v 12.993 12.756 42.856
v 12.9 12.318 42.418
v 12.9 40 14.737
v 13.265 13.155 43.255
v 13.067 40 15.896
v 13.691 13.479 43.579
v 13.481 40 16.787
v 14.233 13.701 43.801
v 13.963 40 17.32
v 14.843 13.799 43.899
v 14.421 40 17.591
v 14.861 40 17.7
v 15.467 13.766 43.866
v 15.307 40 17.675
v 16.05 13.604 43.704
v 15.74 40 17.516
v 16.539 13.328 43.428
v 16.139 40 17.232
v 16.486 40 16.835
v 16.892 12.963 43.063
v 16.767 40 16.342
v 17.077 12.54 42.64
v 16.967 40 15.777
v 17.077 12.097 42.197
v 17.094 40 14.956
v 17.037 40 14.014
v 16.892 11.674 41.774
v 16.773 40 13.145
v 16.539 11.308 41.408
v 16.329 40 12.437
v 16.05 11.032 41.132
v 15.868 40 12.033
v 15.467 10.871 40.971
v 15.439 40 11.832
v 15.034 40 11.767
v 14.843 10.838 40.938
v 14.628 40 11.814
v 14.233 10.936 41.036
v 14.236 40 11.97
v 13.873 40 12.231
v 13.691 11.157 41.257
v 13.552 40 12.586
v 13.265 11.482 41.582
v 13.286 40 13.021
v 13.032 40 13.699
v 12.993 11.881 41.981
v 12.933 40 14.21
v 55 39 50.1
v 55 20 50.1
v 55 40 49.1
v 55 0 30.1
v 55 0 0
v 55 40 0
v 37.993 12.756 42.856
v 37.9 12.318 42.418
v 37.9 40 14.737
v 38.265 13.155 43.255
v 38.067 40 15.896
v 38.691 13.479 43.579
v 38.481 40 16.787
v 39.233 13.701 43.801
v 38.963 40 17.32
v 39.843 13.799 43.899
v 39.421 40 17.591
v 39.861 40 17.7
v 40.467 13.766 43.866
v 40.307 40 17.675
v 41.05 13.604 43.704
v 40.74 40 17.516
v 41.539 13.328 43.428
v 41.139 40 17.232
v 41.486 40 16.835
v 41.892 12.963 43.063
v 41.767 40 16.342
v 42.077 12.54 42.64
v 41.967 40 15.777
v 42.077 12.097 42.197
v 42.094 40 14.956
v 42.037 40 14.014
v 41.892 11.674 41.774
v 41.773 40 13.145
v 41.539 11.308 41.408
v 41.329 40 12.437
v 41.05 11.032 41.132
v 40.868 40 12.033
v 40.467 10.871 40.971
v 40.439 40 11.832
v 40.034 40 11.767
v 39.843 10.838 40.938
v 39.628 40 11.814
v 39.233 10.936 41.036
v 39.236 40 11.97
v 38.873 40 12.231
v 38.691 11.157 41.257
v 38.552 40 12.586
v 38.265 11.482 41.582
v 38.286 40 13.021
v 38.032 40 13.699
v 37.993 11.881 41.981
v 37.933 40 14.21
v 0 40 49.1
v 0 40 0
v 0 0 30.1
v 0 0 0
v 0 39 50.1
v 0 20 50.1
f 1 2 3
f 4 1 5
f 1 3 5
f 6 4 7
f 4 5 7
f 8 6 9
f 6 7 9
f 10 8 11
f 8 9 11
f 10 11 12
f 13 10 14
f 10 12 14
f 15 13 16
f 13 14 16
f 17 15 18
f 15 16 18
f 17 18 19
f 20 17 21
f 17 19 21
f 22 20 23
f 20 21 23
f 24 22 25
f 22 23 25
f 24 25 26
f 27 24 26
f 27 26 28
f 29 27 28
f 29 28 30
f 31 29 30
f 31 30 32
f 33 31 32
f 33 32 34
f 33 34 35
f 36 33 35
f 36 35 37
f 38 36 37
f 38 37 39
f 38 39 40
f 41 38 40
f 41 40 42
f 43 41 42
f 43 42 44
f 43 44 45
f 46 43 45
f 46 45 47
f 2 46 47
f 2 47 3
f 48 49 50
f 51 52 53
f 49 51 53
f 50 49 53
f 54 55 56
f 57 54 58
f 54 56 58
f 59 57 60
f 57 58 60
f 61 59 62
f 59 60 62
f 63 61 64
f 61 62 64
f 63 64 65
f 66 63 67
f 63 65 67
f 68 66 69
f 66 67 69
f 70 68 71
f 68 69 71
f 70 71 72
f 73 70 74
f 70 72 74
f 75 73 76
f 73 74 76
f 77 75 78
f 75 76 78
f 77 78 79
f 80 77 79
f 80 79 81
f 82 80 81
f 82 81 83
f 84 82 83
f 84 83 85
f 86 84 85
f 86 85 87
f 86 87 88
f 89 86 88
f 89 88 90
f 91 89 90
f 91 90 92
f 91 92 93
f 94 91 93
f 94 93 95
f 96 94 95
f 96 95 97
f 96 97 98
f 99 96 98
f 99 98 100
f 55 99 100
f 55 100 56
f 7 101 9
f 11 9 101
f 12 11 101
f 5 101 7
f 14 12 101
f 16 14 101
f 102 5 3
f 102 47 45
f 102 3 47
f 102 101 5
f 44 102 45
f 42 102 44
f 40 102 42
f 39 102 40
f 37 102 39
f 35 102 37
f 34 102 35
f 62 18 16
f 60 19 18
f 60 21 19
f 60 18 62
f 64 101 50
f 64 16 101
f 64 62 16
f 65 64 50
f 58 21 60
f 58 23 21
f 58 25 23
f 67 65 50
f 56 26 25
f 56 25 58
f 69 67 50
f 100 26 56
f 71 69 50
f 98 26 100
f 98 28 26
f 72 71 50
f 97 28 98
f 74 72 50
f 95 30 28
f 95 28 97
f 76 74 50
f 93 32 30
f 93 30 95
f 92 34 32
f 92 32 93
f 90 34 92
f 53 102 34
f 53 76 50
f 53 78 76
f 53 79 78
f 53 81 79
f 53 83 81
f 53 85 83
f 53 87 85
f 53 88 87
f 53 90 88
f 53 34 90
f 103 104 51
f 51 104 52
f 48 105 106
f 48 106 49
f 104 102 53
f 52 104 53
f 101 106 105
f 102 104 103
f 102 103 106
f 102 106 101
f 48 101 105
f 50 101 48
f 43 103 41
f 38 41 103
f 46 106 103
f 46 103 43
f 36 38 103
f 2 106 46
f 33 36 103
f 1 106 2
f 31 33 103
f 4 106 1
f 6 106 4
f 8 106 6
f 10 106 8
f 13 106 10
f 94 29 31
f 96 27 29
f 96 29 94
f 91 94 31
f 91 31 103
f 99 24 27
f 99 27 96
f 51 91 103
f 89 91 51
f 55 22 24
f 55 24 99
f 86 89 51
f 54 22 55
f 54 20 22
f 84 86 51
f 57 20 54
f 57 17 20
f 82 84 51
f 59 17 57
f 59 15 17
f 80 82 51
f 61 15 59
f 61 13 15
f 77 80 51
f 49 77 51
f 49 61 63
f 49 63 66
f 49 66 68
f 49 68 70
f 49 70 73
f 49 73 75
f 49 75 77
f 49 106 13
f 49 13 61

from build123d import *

# Parameters (mm, degrees)
F0_W     = 55
F0_H     = 40
F1_DEPTH = 50.1
F2_SIZE  = 20
F4_D     = 4.2
F5_SIZE  = 1


with BuildPart() as f1:
    # F0 (on Top) → F1 (new body)
    with BuildSketch(Plane.XY):
        with Locations((27.5, 20)):
            Rectangle(F0_W, F0_H)
    extrude(amount=F1_DEPTH)

    # F2
    f2_edges = [f1.edges().sort_by_distance(p)[0] for p in [
        (27.5, 0, 50.1),
    ]]
    chamfer(f2_edges, length=F2_SIZE)

    # F4 (through all)
    with Locations(Plane(origin=(0, -15.05, 15.05), x_dir=(1, 0, 0), z_dir=(0, -0.7071067812, 0.7071067812))):
        with Locations((40, 38.7047119439), (15, 38.7047119439)):
            Hole(F4_D / 2)

    # F5
    f5_edges = [f1.edges().sort_by_distance(p)[0] for p in [
        (27.5, 40, 50.1),
    ]]
    chamfer(f5_edges, length=F5_SIZE)


solid = f1.part
